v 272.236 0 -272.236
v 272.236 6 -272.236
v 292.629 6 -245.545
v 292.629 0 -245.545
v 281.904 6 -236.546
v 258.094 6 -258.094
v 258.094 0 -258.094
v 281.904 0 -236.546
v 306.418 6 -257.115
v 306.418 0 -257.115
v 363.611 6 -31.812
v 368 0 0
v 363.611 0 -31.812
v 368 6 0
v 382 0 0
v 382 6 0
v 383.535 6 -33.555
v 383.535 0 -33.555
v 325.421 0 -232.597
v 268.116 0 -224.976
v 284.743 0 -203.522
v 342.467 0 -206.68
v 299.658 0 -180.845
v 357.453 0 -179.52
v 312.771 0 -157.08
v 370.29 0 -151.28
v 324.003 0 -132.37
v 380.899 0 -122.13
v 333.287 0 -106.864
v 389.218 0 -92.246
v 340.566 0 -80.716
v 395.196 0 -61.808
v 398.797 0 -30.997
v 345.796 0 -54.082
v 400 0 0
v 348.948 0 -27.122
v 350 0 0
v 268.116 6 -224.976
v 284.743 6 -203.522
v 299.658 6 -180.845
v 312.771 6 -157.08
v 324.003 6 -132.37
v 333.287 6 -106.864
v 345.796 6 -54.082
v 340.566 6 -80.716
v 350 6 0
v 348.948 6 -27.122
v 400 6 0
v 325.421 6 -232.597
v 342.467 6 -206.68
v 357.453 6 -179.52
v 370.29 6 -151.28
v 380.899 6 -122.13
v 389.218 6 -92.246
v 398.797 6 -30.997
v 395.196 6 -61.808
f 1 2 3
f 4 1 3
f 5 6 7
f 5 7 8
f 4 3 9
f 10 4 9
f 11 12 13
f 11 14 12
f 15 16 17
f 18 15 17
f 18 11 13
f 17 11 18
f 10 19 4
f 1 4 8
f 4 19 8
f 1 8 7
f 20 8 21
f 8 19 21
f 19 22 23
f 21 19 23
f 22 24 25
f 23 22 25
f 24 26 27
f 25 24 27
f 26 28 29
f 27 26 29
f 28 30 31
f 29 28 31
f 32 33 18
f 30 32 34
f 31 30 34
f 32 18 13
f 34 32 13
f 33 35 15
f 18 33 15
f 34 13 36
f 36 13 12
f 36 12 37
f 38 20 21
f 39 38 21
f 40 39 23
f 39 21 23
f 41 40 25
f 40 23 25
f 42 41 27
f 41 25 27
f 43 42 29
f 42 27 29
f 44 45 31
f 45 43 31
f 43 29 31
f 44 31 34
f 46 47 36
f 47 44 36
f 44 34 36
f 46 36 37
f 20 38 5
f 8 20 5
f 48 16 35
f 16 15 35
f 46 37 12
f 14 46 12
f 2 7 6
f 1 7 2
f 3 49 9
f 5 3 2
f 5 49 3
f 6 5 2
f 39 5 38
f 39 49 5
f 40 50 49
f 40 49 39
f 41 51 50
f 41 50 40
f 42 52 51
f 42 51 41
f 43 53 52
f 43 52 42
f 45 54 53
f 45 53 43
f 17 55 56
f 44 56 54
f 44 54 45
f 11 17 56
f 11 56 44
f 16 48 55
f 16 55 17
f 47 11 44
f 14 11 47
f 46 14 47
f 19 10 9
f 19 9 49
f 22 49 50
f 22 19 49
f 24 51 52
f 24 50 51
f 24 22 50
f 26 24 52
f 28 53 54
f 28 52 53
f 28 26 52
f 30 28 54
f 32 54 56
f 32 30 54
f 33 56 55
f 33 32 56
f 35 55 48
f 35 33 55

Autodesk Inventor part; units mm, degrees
ref_plane "YZ Plane" through (0, 0, 0) normal (1, 0, 0) x (0, 1, 0)
ref_plane "XZ Plane" through (0, 0, 0) normal (0, 1, 0) x (-1, 0, 0)
ref_plane "XY Plane" through (0, 0, 0) normal (0, 0, 1) x (1, 0, 0)
sketch "Esboço1" plane through (0, 0, 0) normal (0, 1, 0) x (-1, 0, 0)
  arc A0 (-350, 0) -> (-247.4874, -247.4874) centre (0, 0) ccw
  arc A1 (-400, 0) -> (-282.8427, -282.8427) centre (0, 0) ccw
  circle A2 centre (0, 0) radius 400
  circle A3 centre (0, 0) radius 350
  line L0 (0, 0) -> (-407.9373, -407.9373)
  line L1 (0, 0) -> (-1224.3013, 0) construction
  line L2 (-350, 0) -> (-400, 0)
  point P0 (-282.8427, -282.8427)
  point P1 (-247.4874, -247.4874)
  dimension "d27" = 700
  dimension "d28" = 800
  dimension "d87" = 45
extrude "Extrusão1" add sketch "Esboço1" along normal blind 6 contours A0 L0 A1 L2
sketch "Esboço5" plane through (0, 6, 0) normal (0, 1, 0) x (1, 0, 0)
  arc A0 (400, 0) -> (282.8427, 282.8427) centre (0, 0) ccw projected
  circle A1 centre (0, 0) radius 400
  circle A2 centre (0, 0) radius 350
  line L0 (0, 0) -> (356.9788, 299.5408)
  line L1 (282.8427, 282.8427) -> (247.4874, 247.4874) projected
  line L2 (282.8427, 282.8427) -> (272.2361, 272.2361)
  line L3 (272.2361, 272.2361) -> (258.094, 258.094)
  line L4 (258.094, 258.094) -> (247.4874, 247.4874)
  line L5 (306.4178, 257.115) -> (292.629, 245.5449)
  line L6 (292.629, 245.5449) -> (281.9044, 236.5458)
  line L7 (281.9044, 236.5458) -> (268.1156, 224.9757)
  line L8 (258.094, 258.094) -> (281.9044, 236.5458)
  line L9 (272.2361, 272.2361) -> (292.629, 245.5449)
  point P0 (306.4178, 257.115)
  dimension "d88" = -5
  dimension "d89" = 15
  dimension "d90" = 20
  dimension "d91" = 18
  dimension "d92" = 14
extrude "Extrusão5" cut sketch "Esboço5" against normal up to surface (6 mm away) contours L0 L9 L1 A0 | L0 A2 L1 L8
sketch "Esboço6" plane through (0, 6, 0) normal (0, 1, 0) x (1, 0, 0)
  arc A0 (400, 0) -> (306.4178, 257.115) centre (0, 0) ccw projected
  circle A1 centre (0, 0) radius 400
  arc A2 (350, 0) -> (224.9757, 268.1156) centre (0, 0) ccw projected
  circle A3 centre (0, 0) radius 350
  line L0 (0, 0) -> (512.6153, 44.848)
  line L1 (350, 0) -> (400, 0) projected
  line L2 (350, 0) -> (368, 0)
  line L3 (368, 0) -> (382, 0)
  line L4 (382, 0) -> (400, 0)
  line L5 (348.6681, 30.5045) -> (363.6111, 31.8118)
  line L6 (363.6111, 31.8118) -> (383.535, 33.555)
  line L7 (383.535, 33.555) -> (398.4779, 34.8623)
  line L8 (368, 0) -> (363.6111, 31.8118)
  line L9 (382, 0) -> (383.535, 33.555)
  point P0 (257.115, 306.4178)
  dimension "d93" = -5
  dimension "d94" = 18
  dimension "d95" = 14
  dimension "d96" = 15
  dimension "d97" = 20
extrude "Extrusão6" cut sketch "Esboço6" against normal up to surface (6 mm away) contours L1 L8 L0 L9
properties part number "base"
